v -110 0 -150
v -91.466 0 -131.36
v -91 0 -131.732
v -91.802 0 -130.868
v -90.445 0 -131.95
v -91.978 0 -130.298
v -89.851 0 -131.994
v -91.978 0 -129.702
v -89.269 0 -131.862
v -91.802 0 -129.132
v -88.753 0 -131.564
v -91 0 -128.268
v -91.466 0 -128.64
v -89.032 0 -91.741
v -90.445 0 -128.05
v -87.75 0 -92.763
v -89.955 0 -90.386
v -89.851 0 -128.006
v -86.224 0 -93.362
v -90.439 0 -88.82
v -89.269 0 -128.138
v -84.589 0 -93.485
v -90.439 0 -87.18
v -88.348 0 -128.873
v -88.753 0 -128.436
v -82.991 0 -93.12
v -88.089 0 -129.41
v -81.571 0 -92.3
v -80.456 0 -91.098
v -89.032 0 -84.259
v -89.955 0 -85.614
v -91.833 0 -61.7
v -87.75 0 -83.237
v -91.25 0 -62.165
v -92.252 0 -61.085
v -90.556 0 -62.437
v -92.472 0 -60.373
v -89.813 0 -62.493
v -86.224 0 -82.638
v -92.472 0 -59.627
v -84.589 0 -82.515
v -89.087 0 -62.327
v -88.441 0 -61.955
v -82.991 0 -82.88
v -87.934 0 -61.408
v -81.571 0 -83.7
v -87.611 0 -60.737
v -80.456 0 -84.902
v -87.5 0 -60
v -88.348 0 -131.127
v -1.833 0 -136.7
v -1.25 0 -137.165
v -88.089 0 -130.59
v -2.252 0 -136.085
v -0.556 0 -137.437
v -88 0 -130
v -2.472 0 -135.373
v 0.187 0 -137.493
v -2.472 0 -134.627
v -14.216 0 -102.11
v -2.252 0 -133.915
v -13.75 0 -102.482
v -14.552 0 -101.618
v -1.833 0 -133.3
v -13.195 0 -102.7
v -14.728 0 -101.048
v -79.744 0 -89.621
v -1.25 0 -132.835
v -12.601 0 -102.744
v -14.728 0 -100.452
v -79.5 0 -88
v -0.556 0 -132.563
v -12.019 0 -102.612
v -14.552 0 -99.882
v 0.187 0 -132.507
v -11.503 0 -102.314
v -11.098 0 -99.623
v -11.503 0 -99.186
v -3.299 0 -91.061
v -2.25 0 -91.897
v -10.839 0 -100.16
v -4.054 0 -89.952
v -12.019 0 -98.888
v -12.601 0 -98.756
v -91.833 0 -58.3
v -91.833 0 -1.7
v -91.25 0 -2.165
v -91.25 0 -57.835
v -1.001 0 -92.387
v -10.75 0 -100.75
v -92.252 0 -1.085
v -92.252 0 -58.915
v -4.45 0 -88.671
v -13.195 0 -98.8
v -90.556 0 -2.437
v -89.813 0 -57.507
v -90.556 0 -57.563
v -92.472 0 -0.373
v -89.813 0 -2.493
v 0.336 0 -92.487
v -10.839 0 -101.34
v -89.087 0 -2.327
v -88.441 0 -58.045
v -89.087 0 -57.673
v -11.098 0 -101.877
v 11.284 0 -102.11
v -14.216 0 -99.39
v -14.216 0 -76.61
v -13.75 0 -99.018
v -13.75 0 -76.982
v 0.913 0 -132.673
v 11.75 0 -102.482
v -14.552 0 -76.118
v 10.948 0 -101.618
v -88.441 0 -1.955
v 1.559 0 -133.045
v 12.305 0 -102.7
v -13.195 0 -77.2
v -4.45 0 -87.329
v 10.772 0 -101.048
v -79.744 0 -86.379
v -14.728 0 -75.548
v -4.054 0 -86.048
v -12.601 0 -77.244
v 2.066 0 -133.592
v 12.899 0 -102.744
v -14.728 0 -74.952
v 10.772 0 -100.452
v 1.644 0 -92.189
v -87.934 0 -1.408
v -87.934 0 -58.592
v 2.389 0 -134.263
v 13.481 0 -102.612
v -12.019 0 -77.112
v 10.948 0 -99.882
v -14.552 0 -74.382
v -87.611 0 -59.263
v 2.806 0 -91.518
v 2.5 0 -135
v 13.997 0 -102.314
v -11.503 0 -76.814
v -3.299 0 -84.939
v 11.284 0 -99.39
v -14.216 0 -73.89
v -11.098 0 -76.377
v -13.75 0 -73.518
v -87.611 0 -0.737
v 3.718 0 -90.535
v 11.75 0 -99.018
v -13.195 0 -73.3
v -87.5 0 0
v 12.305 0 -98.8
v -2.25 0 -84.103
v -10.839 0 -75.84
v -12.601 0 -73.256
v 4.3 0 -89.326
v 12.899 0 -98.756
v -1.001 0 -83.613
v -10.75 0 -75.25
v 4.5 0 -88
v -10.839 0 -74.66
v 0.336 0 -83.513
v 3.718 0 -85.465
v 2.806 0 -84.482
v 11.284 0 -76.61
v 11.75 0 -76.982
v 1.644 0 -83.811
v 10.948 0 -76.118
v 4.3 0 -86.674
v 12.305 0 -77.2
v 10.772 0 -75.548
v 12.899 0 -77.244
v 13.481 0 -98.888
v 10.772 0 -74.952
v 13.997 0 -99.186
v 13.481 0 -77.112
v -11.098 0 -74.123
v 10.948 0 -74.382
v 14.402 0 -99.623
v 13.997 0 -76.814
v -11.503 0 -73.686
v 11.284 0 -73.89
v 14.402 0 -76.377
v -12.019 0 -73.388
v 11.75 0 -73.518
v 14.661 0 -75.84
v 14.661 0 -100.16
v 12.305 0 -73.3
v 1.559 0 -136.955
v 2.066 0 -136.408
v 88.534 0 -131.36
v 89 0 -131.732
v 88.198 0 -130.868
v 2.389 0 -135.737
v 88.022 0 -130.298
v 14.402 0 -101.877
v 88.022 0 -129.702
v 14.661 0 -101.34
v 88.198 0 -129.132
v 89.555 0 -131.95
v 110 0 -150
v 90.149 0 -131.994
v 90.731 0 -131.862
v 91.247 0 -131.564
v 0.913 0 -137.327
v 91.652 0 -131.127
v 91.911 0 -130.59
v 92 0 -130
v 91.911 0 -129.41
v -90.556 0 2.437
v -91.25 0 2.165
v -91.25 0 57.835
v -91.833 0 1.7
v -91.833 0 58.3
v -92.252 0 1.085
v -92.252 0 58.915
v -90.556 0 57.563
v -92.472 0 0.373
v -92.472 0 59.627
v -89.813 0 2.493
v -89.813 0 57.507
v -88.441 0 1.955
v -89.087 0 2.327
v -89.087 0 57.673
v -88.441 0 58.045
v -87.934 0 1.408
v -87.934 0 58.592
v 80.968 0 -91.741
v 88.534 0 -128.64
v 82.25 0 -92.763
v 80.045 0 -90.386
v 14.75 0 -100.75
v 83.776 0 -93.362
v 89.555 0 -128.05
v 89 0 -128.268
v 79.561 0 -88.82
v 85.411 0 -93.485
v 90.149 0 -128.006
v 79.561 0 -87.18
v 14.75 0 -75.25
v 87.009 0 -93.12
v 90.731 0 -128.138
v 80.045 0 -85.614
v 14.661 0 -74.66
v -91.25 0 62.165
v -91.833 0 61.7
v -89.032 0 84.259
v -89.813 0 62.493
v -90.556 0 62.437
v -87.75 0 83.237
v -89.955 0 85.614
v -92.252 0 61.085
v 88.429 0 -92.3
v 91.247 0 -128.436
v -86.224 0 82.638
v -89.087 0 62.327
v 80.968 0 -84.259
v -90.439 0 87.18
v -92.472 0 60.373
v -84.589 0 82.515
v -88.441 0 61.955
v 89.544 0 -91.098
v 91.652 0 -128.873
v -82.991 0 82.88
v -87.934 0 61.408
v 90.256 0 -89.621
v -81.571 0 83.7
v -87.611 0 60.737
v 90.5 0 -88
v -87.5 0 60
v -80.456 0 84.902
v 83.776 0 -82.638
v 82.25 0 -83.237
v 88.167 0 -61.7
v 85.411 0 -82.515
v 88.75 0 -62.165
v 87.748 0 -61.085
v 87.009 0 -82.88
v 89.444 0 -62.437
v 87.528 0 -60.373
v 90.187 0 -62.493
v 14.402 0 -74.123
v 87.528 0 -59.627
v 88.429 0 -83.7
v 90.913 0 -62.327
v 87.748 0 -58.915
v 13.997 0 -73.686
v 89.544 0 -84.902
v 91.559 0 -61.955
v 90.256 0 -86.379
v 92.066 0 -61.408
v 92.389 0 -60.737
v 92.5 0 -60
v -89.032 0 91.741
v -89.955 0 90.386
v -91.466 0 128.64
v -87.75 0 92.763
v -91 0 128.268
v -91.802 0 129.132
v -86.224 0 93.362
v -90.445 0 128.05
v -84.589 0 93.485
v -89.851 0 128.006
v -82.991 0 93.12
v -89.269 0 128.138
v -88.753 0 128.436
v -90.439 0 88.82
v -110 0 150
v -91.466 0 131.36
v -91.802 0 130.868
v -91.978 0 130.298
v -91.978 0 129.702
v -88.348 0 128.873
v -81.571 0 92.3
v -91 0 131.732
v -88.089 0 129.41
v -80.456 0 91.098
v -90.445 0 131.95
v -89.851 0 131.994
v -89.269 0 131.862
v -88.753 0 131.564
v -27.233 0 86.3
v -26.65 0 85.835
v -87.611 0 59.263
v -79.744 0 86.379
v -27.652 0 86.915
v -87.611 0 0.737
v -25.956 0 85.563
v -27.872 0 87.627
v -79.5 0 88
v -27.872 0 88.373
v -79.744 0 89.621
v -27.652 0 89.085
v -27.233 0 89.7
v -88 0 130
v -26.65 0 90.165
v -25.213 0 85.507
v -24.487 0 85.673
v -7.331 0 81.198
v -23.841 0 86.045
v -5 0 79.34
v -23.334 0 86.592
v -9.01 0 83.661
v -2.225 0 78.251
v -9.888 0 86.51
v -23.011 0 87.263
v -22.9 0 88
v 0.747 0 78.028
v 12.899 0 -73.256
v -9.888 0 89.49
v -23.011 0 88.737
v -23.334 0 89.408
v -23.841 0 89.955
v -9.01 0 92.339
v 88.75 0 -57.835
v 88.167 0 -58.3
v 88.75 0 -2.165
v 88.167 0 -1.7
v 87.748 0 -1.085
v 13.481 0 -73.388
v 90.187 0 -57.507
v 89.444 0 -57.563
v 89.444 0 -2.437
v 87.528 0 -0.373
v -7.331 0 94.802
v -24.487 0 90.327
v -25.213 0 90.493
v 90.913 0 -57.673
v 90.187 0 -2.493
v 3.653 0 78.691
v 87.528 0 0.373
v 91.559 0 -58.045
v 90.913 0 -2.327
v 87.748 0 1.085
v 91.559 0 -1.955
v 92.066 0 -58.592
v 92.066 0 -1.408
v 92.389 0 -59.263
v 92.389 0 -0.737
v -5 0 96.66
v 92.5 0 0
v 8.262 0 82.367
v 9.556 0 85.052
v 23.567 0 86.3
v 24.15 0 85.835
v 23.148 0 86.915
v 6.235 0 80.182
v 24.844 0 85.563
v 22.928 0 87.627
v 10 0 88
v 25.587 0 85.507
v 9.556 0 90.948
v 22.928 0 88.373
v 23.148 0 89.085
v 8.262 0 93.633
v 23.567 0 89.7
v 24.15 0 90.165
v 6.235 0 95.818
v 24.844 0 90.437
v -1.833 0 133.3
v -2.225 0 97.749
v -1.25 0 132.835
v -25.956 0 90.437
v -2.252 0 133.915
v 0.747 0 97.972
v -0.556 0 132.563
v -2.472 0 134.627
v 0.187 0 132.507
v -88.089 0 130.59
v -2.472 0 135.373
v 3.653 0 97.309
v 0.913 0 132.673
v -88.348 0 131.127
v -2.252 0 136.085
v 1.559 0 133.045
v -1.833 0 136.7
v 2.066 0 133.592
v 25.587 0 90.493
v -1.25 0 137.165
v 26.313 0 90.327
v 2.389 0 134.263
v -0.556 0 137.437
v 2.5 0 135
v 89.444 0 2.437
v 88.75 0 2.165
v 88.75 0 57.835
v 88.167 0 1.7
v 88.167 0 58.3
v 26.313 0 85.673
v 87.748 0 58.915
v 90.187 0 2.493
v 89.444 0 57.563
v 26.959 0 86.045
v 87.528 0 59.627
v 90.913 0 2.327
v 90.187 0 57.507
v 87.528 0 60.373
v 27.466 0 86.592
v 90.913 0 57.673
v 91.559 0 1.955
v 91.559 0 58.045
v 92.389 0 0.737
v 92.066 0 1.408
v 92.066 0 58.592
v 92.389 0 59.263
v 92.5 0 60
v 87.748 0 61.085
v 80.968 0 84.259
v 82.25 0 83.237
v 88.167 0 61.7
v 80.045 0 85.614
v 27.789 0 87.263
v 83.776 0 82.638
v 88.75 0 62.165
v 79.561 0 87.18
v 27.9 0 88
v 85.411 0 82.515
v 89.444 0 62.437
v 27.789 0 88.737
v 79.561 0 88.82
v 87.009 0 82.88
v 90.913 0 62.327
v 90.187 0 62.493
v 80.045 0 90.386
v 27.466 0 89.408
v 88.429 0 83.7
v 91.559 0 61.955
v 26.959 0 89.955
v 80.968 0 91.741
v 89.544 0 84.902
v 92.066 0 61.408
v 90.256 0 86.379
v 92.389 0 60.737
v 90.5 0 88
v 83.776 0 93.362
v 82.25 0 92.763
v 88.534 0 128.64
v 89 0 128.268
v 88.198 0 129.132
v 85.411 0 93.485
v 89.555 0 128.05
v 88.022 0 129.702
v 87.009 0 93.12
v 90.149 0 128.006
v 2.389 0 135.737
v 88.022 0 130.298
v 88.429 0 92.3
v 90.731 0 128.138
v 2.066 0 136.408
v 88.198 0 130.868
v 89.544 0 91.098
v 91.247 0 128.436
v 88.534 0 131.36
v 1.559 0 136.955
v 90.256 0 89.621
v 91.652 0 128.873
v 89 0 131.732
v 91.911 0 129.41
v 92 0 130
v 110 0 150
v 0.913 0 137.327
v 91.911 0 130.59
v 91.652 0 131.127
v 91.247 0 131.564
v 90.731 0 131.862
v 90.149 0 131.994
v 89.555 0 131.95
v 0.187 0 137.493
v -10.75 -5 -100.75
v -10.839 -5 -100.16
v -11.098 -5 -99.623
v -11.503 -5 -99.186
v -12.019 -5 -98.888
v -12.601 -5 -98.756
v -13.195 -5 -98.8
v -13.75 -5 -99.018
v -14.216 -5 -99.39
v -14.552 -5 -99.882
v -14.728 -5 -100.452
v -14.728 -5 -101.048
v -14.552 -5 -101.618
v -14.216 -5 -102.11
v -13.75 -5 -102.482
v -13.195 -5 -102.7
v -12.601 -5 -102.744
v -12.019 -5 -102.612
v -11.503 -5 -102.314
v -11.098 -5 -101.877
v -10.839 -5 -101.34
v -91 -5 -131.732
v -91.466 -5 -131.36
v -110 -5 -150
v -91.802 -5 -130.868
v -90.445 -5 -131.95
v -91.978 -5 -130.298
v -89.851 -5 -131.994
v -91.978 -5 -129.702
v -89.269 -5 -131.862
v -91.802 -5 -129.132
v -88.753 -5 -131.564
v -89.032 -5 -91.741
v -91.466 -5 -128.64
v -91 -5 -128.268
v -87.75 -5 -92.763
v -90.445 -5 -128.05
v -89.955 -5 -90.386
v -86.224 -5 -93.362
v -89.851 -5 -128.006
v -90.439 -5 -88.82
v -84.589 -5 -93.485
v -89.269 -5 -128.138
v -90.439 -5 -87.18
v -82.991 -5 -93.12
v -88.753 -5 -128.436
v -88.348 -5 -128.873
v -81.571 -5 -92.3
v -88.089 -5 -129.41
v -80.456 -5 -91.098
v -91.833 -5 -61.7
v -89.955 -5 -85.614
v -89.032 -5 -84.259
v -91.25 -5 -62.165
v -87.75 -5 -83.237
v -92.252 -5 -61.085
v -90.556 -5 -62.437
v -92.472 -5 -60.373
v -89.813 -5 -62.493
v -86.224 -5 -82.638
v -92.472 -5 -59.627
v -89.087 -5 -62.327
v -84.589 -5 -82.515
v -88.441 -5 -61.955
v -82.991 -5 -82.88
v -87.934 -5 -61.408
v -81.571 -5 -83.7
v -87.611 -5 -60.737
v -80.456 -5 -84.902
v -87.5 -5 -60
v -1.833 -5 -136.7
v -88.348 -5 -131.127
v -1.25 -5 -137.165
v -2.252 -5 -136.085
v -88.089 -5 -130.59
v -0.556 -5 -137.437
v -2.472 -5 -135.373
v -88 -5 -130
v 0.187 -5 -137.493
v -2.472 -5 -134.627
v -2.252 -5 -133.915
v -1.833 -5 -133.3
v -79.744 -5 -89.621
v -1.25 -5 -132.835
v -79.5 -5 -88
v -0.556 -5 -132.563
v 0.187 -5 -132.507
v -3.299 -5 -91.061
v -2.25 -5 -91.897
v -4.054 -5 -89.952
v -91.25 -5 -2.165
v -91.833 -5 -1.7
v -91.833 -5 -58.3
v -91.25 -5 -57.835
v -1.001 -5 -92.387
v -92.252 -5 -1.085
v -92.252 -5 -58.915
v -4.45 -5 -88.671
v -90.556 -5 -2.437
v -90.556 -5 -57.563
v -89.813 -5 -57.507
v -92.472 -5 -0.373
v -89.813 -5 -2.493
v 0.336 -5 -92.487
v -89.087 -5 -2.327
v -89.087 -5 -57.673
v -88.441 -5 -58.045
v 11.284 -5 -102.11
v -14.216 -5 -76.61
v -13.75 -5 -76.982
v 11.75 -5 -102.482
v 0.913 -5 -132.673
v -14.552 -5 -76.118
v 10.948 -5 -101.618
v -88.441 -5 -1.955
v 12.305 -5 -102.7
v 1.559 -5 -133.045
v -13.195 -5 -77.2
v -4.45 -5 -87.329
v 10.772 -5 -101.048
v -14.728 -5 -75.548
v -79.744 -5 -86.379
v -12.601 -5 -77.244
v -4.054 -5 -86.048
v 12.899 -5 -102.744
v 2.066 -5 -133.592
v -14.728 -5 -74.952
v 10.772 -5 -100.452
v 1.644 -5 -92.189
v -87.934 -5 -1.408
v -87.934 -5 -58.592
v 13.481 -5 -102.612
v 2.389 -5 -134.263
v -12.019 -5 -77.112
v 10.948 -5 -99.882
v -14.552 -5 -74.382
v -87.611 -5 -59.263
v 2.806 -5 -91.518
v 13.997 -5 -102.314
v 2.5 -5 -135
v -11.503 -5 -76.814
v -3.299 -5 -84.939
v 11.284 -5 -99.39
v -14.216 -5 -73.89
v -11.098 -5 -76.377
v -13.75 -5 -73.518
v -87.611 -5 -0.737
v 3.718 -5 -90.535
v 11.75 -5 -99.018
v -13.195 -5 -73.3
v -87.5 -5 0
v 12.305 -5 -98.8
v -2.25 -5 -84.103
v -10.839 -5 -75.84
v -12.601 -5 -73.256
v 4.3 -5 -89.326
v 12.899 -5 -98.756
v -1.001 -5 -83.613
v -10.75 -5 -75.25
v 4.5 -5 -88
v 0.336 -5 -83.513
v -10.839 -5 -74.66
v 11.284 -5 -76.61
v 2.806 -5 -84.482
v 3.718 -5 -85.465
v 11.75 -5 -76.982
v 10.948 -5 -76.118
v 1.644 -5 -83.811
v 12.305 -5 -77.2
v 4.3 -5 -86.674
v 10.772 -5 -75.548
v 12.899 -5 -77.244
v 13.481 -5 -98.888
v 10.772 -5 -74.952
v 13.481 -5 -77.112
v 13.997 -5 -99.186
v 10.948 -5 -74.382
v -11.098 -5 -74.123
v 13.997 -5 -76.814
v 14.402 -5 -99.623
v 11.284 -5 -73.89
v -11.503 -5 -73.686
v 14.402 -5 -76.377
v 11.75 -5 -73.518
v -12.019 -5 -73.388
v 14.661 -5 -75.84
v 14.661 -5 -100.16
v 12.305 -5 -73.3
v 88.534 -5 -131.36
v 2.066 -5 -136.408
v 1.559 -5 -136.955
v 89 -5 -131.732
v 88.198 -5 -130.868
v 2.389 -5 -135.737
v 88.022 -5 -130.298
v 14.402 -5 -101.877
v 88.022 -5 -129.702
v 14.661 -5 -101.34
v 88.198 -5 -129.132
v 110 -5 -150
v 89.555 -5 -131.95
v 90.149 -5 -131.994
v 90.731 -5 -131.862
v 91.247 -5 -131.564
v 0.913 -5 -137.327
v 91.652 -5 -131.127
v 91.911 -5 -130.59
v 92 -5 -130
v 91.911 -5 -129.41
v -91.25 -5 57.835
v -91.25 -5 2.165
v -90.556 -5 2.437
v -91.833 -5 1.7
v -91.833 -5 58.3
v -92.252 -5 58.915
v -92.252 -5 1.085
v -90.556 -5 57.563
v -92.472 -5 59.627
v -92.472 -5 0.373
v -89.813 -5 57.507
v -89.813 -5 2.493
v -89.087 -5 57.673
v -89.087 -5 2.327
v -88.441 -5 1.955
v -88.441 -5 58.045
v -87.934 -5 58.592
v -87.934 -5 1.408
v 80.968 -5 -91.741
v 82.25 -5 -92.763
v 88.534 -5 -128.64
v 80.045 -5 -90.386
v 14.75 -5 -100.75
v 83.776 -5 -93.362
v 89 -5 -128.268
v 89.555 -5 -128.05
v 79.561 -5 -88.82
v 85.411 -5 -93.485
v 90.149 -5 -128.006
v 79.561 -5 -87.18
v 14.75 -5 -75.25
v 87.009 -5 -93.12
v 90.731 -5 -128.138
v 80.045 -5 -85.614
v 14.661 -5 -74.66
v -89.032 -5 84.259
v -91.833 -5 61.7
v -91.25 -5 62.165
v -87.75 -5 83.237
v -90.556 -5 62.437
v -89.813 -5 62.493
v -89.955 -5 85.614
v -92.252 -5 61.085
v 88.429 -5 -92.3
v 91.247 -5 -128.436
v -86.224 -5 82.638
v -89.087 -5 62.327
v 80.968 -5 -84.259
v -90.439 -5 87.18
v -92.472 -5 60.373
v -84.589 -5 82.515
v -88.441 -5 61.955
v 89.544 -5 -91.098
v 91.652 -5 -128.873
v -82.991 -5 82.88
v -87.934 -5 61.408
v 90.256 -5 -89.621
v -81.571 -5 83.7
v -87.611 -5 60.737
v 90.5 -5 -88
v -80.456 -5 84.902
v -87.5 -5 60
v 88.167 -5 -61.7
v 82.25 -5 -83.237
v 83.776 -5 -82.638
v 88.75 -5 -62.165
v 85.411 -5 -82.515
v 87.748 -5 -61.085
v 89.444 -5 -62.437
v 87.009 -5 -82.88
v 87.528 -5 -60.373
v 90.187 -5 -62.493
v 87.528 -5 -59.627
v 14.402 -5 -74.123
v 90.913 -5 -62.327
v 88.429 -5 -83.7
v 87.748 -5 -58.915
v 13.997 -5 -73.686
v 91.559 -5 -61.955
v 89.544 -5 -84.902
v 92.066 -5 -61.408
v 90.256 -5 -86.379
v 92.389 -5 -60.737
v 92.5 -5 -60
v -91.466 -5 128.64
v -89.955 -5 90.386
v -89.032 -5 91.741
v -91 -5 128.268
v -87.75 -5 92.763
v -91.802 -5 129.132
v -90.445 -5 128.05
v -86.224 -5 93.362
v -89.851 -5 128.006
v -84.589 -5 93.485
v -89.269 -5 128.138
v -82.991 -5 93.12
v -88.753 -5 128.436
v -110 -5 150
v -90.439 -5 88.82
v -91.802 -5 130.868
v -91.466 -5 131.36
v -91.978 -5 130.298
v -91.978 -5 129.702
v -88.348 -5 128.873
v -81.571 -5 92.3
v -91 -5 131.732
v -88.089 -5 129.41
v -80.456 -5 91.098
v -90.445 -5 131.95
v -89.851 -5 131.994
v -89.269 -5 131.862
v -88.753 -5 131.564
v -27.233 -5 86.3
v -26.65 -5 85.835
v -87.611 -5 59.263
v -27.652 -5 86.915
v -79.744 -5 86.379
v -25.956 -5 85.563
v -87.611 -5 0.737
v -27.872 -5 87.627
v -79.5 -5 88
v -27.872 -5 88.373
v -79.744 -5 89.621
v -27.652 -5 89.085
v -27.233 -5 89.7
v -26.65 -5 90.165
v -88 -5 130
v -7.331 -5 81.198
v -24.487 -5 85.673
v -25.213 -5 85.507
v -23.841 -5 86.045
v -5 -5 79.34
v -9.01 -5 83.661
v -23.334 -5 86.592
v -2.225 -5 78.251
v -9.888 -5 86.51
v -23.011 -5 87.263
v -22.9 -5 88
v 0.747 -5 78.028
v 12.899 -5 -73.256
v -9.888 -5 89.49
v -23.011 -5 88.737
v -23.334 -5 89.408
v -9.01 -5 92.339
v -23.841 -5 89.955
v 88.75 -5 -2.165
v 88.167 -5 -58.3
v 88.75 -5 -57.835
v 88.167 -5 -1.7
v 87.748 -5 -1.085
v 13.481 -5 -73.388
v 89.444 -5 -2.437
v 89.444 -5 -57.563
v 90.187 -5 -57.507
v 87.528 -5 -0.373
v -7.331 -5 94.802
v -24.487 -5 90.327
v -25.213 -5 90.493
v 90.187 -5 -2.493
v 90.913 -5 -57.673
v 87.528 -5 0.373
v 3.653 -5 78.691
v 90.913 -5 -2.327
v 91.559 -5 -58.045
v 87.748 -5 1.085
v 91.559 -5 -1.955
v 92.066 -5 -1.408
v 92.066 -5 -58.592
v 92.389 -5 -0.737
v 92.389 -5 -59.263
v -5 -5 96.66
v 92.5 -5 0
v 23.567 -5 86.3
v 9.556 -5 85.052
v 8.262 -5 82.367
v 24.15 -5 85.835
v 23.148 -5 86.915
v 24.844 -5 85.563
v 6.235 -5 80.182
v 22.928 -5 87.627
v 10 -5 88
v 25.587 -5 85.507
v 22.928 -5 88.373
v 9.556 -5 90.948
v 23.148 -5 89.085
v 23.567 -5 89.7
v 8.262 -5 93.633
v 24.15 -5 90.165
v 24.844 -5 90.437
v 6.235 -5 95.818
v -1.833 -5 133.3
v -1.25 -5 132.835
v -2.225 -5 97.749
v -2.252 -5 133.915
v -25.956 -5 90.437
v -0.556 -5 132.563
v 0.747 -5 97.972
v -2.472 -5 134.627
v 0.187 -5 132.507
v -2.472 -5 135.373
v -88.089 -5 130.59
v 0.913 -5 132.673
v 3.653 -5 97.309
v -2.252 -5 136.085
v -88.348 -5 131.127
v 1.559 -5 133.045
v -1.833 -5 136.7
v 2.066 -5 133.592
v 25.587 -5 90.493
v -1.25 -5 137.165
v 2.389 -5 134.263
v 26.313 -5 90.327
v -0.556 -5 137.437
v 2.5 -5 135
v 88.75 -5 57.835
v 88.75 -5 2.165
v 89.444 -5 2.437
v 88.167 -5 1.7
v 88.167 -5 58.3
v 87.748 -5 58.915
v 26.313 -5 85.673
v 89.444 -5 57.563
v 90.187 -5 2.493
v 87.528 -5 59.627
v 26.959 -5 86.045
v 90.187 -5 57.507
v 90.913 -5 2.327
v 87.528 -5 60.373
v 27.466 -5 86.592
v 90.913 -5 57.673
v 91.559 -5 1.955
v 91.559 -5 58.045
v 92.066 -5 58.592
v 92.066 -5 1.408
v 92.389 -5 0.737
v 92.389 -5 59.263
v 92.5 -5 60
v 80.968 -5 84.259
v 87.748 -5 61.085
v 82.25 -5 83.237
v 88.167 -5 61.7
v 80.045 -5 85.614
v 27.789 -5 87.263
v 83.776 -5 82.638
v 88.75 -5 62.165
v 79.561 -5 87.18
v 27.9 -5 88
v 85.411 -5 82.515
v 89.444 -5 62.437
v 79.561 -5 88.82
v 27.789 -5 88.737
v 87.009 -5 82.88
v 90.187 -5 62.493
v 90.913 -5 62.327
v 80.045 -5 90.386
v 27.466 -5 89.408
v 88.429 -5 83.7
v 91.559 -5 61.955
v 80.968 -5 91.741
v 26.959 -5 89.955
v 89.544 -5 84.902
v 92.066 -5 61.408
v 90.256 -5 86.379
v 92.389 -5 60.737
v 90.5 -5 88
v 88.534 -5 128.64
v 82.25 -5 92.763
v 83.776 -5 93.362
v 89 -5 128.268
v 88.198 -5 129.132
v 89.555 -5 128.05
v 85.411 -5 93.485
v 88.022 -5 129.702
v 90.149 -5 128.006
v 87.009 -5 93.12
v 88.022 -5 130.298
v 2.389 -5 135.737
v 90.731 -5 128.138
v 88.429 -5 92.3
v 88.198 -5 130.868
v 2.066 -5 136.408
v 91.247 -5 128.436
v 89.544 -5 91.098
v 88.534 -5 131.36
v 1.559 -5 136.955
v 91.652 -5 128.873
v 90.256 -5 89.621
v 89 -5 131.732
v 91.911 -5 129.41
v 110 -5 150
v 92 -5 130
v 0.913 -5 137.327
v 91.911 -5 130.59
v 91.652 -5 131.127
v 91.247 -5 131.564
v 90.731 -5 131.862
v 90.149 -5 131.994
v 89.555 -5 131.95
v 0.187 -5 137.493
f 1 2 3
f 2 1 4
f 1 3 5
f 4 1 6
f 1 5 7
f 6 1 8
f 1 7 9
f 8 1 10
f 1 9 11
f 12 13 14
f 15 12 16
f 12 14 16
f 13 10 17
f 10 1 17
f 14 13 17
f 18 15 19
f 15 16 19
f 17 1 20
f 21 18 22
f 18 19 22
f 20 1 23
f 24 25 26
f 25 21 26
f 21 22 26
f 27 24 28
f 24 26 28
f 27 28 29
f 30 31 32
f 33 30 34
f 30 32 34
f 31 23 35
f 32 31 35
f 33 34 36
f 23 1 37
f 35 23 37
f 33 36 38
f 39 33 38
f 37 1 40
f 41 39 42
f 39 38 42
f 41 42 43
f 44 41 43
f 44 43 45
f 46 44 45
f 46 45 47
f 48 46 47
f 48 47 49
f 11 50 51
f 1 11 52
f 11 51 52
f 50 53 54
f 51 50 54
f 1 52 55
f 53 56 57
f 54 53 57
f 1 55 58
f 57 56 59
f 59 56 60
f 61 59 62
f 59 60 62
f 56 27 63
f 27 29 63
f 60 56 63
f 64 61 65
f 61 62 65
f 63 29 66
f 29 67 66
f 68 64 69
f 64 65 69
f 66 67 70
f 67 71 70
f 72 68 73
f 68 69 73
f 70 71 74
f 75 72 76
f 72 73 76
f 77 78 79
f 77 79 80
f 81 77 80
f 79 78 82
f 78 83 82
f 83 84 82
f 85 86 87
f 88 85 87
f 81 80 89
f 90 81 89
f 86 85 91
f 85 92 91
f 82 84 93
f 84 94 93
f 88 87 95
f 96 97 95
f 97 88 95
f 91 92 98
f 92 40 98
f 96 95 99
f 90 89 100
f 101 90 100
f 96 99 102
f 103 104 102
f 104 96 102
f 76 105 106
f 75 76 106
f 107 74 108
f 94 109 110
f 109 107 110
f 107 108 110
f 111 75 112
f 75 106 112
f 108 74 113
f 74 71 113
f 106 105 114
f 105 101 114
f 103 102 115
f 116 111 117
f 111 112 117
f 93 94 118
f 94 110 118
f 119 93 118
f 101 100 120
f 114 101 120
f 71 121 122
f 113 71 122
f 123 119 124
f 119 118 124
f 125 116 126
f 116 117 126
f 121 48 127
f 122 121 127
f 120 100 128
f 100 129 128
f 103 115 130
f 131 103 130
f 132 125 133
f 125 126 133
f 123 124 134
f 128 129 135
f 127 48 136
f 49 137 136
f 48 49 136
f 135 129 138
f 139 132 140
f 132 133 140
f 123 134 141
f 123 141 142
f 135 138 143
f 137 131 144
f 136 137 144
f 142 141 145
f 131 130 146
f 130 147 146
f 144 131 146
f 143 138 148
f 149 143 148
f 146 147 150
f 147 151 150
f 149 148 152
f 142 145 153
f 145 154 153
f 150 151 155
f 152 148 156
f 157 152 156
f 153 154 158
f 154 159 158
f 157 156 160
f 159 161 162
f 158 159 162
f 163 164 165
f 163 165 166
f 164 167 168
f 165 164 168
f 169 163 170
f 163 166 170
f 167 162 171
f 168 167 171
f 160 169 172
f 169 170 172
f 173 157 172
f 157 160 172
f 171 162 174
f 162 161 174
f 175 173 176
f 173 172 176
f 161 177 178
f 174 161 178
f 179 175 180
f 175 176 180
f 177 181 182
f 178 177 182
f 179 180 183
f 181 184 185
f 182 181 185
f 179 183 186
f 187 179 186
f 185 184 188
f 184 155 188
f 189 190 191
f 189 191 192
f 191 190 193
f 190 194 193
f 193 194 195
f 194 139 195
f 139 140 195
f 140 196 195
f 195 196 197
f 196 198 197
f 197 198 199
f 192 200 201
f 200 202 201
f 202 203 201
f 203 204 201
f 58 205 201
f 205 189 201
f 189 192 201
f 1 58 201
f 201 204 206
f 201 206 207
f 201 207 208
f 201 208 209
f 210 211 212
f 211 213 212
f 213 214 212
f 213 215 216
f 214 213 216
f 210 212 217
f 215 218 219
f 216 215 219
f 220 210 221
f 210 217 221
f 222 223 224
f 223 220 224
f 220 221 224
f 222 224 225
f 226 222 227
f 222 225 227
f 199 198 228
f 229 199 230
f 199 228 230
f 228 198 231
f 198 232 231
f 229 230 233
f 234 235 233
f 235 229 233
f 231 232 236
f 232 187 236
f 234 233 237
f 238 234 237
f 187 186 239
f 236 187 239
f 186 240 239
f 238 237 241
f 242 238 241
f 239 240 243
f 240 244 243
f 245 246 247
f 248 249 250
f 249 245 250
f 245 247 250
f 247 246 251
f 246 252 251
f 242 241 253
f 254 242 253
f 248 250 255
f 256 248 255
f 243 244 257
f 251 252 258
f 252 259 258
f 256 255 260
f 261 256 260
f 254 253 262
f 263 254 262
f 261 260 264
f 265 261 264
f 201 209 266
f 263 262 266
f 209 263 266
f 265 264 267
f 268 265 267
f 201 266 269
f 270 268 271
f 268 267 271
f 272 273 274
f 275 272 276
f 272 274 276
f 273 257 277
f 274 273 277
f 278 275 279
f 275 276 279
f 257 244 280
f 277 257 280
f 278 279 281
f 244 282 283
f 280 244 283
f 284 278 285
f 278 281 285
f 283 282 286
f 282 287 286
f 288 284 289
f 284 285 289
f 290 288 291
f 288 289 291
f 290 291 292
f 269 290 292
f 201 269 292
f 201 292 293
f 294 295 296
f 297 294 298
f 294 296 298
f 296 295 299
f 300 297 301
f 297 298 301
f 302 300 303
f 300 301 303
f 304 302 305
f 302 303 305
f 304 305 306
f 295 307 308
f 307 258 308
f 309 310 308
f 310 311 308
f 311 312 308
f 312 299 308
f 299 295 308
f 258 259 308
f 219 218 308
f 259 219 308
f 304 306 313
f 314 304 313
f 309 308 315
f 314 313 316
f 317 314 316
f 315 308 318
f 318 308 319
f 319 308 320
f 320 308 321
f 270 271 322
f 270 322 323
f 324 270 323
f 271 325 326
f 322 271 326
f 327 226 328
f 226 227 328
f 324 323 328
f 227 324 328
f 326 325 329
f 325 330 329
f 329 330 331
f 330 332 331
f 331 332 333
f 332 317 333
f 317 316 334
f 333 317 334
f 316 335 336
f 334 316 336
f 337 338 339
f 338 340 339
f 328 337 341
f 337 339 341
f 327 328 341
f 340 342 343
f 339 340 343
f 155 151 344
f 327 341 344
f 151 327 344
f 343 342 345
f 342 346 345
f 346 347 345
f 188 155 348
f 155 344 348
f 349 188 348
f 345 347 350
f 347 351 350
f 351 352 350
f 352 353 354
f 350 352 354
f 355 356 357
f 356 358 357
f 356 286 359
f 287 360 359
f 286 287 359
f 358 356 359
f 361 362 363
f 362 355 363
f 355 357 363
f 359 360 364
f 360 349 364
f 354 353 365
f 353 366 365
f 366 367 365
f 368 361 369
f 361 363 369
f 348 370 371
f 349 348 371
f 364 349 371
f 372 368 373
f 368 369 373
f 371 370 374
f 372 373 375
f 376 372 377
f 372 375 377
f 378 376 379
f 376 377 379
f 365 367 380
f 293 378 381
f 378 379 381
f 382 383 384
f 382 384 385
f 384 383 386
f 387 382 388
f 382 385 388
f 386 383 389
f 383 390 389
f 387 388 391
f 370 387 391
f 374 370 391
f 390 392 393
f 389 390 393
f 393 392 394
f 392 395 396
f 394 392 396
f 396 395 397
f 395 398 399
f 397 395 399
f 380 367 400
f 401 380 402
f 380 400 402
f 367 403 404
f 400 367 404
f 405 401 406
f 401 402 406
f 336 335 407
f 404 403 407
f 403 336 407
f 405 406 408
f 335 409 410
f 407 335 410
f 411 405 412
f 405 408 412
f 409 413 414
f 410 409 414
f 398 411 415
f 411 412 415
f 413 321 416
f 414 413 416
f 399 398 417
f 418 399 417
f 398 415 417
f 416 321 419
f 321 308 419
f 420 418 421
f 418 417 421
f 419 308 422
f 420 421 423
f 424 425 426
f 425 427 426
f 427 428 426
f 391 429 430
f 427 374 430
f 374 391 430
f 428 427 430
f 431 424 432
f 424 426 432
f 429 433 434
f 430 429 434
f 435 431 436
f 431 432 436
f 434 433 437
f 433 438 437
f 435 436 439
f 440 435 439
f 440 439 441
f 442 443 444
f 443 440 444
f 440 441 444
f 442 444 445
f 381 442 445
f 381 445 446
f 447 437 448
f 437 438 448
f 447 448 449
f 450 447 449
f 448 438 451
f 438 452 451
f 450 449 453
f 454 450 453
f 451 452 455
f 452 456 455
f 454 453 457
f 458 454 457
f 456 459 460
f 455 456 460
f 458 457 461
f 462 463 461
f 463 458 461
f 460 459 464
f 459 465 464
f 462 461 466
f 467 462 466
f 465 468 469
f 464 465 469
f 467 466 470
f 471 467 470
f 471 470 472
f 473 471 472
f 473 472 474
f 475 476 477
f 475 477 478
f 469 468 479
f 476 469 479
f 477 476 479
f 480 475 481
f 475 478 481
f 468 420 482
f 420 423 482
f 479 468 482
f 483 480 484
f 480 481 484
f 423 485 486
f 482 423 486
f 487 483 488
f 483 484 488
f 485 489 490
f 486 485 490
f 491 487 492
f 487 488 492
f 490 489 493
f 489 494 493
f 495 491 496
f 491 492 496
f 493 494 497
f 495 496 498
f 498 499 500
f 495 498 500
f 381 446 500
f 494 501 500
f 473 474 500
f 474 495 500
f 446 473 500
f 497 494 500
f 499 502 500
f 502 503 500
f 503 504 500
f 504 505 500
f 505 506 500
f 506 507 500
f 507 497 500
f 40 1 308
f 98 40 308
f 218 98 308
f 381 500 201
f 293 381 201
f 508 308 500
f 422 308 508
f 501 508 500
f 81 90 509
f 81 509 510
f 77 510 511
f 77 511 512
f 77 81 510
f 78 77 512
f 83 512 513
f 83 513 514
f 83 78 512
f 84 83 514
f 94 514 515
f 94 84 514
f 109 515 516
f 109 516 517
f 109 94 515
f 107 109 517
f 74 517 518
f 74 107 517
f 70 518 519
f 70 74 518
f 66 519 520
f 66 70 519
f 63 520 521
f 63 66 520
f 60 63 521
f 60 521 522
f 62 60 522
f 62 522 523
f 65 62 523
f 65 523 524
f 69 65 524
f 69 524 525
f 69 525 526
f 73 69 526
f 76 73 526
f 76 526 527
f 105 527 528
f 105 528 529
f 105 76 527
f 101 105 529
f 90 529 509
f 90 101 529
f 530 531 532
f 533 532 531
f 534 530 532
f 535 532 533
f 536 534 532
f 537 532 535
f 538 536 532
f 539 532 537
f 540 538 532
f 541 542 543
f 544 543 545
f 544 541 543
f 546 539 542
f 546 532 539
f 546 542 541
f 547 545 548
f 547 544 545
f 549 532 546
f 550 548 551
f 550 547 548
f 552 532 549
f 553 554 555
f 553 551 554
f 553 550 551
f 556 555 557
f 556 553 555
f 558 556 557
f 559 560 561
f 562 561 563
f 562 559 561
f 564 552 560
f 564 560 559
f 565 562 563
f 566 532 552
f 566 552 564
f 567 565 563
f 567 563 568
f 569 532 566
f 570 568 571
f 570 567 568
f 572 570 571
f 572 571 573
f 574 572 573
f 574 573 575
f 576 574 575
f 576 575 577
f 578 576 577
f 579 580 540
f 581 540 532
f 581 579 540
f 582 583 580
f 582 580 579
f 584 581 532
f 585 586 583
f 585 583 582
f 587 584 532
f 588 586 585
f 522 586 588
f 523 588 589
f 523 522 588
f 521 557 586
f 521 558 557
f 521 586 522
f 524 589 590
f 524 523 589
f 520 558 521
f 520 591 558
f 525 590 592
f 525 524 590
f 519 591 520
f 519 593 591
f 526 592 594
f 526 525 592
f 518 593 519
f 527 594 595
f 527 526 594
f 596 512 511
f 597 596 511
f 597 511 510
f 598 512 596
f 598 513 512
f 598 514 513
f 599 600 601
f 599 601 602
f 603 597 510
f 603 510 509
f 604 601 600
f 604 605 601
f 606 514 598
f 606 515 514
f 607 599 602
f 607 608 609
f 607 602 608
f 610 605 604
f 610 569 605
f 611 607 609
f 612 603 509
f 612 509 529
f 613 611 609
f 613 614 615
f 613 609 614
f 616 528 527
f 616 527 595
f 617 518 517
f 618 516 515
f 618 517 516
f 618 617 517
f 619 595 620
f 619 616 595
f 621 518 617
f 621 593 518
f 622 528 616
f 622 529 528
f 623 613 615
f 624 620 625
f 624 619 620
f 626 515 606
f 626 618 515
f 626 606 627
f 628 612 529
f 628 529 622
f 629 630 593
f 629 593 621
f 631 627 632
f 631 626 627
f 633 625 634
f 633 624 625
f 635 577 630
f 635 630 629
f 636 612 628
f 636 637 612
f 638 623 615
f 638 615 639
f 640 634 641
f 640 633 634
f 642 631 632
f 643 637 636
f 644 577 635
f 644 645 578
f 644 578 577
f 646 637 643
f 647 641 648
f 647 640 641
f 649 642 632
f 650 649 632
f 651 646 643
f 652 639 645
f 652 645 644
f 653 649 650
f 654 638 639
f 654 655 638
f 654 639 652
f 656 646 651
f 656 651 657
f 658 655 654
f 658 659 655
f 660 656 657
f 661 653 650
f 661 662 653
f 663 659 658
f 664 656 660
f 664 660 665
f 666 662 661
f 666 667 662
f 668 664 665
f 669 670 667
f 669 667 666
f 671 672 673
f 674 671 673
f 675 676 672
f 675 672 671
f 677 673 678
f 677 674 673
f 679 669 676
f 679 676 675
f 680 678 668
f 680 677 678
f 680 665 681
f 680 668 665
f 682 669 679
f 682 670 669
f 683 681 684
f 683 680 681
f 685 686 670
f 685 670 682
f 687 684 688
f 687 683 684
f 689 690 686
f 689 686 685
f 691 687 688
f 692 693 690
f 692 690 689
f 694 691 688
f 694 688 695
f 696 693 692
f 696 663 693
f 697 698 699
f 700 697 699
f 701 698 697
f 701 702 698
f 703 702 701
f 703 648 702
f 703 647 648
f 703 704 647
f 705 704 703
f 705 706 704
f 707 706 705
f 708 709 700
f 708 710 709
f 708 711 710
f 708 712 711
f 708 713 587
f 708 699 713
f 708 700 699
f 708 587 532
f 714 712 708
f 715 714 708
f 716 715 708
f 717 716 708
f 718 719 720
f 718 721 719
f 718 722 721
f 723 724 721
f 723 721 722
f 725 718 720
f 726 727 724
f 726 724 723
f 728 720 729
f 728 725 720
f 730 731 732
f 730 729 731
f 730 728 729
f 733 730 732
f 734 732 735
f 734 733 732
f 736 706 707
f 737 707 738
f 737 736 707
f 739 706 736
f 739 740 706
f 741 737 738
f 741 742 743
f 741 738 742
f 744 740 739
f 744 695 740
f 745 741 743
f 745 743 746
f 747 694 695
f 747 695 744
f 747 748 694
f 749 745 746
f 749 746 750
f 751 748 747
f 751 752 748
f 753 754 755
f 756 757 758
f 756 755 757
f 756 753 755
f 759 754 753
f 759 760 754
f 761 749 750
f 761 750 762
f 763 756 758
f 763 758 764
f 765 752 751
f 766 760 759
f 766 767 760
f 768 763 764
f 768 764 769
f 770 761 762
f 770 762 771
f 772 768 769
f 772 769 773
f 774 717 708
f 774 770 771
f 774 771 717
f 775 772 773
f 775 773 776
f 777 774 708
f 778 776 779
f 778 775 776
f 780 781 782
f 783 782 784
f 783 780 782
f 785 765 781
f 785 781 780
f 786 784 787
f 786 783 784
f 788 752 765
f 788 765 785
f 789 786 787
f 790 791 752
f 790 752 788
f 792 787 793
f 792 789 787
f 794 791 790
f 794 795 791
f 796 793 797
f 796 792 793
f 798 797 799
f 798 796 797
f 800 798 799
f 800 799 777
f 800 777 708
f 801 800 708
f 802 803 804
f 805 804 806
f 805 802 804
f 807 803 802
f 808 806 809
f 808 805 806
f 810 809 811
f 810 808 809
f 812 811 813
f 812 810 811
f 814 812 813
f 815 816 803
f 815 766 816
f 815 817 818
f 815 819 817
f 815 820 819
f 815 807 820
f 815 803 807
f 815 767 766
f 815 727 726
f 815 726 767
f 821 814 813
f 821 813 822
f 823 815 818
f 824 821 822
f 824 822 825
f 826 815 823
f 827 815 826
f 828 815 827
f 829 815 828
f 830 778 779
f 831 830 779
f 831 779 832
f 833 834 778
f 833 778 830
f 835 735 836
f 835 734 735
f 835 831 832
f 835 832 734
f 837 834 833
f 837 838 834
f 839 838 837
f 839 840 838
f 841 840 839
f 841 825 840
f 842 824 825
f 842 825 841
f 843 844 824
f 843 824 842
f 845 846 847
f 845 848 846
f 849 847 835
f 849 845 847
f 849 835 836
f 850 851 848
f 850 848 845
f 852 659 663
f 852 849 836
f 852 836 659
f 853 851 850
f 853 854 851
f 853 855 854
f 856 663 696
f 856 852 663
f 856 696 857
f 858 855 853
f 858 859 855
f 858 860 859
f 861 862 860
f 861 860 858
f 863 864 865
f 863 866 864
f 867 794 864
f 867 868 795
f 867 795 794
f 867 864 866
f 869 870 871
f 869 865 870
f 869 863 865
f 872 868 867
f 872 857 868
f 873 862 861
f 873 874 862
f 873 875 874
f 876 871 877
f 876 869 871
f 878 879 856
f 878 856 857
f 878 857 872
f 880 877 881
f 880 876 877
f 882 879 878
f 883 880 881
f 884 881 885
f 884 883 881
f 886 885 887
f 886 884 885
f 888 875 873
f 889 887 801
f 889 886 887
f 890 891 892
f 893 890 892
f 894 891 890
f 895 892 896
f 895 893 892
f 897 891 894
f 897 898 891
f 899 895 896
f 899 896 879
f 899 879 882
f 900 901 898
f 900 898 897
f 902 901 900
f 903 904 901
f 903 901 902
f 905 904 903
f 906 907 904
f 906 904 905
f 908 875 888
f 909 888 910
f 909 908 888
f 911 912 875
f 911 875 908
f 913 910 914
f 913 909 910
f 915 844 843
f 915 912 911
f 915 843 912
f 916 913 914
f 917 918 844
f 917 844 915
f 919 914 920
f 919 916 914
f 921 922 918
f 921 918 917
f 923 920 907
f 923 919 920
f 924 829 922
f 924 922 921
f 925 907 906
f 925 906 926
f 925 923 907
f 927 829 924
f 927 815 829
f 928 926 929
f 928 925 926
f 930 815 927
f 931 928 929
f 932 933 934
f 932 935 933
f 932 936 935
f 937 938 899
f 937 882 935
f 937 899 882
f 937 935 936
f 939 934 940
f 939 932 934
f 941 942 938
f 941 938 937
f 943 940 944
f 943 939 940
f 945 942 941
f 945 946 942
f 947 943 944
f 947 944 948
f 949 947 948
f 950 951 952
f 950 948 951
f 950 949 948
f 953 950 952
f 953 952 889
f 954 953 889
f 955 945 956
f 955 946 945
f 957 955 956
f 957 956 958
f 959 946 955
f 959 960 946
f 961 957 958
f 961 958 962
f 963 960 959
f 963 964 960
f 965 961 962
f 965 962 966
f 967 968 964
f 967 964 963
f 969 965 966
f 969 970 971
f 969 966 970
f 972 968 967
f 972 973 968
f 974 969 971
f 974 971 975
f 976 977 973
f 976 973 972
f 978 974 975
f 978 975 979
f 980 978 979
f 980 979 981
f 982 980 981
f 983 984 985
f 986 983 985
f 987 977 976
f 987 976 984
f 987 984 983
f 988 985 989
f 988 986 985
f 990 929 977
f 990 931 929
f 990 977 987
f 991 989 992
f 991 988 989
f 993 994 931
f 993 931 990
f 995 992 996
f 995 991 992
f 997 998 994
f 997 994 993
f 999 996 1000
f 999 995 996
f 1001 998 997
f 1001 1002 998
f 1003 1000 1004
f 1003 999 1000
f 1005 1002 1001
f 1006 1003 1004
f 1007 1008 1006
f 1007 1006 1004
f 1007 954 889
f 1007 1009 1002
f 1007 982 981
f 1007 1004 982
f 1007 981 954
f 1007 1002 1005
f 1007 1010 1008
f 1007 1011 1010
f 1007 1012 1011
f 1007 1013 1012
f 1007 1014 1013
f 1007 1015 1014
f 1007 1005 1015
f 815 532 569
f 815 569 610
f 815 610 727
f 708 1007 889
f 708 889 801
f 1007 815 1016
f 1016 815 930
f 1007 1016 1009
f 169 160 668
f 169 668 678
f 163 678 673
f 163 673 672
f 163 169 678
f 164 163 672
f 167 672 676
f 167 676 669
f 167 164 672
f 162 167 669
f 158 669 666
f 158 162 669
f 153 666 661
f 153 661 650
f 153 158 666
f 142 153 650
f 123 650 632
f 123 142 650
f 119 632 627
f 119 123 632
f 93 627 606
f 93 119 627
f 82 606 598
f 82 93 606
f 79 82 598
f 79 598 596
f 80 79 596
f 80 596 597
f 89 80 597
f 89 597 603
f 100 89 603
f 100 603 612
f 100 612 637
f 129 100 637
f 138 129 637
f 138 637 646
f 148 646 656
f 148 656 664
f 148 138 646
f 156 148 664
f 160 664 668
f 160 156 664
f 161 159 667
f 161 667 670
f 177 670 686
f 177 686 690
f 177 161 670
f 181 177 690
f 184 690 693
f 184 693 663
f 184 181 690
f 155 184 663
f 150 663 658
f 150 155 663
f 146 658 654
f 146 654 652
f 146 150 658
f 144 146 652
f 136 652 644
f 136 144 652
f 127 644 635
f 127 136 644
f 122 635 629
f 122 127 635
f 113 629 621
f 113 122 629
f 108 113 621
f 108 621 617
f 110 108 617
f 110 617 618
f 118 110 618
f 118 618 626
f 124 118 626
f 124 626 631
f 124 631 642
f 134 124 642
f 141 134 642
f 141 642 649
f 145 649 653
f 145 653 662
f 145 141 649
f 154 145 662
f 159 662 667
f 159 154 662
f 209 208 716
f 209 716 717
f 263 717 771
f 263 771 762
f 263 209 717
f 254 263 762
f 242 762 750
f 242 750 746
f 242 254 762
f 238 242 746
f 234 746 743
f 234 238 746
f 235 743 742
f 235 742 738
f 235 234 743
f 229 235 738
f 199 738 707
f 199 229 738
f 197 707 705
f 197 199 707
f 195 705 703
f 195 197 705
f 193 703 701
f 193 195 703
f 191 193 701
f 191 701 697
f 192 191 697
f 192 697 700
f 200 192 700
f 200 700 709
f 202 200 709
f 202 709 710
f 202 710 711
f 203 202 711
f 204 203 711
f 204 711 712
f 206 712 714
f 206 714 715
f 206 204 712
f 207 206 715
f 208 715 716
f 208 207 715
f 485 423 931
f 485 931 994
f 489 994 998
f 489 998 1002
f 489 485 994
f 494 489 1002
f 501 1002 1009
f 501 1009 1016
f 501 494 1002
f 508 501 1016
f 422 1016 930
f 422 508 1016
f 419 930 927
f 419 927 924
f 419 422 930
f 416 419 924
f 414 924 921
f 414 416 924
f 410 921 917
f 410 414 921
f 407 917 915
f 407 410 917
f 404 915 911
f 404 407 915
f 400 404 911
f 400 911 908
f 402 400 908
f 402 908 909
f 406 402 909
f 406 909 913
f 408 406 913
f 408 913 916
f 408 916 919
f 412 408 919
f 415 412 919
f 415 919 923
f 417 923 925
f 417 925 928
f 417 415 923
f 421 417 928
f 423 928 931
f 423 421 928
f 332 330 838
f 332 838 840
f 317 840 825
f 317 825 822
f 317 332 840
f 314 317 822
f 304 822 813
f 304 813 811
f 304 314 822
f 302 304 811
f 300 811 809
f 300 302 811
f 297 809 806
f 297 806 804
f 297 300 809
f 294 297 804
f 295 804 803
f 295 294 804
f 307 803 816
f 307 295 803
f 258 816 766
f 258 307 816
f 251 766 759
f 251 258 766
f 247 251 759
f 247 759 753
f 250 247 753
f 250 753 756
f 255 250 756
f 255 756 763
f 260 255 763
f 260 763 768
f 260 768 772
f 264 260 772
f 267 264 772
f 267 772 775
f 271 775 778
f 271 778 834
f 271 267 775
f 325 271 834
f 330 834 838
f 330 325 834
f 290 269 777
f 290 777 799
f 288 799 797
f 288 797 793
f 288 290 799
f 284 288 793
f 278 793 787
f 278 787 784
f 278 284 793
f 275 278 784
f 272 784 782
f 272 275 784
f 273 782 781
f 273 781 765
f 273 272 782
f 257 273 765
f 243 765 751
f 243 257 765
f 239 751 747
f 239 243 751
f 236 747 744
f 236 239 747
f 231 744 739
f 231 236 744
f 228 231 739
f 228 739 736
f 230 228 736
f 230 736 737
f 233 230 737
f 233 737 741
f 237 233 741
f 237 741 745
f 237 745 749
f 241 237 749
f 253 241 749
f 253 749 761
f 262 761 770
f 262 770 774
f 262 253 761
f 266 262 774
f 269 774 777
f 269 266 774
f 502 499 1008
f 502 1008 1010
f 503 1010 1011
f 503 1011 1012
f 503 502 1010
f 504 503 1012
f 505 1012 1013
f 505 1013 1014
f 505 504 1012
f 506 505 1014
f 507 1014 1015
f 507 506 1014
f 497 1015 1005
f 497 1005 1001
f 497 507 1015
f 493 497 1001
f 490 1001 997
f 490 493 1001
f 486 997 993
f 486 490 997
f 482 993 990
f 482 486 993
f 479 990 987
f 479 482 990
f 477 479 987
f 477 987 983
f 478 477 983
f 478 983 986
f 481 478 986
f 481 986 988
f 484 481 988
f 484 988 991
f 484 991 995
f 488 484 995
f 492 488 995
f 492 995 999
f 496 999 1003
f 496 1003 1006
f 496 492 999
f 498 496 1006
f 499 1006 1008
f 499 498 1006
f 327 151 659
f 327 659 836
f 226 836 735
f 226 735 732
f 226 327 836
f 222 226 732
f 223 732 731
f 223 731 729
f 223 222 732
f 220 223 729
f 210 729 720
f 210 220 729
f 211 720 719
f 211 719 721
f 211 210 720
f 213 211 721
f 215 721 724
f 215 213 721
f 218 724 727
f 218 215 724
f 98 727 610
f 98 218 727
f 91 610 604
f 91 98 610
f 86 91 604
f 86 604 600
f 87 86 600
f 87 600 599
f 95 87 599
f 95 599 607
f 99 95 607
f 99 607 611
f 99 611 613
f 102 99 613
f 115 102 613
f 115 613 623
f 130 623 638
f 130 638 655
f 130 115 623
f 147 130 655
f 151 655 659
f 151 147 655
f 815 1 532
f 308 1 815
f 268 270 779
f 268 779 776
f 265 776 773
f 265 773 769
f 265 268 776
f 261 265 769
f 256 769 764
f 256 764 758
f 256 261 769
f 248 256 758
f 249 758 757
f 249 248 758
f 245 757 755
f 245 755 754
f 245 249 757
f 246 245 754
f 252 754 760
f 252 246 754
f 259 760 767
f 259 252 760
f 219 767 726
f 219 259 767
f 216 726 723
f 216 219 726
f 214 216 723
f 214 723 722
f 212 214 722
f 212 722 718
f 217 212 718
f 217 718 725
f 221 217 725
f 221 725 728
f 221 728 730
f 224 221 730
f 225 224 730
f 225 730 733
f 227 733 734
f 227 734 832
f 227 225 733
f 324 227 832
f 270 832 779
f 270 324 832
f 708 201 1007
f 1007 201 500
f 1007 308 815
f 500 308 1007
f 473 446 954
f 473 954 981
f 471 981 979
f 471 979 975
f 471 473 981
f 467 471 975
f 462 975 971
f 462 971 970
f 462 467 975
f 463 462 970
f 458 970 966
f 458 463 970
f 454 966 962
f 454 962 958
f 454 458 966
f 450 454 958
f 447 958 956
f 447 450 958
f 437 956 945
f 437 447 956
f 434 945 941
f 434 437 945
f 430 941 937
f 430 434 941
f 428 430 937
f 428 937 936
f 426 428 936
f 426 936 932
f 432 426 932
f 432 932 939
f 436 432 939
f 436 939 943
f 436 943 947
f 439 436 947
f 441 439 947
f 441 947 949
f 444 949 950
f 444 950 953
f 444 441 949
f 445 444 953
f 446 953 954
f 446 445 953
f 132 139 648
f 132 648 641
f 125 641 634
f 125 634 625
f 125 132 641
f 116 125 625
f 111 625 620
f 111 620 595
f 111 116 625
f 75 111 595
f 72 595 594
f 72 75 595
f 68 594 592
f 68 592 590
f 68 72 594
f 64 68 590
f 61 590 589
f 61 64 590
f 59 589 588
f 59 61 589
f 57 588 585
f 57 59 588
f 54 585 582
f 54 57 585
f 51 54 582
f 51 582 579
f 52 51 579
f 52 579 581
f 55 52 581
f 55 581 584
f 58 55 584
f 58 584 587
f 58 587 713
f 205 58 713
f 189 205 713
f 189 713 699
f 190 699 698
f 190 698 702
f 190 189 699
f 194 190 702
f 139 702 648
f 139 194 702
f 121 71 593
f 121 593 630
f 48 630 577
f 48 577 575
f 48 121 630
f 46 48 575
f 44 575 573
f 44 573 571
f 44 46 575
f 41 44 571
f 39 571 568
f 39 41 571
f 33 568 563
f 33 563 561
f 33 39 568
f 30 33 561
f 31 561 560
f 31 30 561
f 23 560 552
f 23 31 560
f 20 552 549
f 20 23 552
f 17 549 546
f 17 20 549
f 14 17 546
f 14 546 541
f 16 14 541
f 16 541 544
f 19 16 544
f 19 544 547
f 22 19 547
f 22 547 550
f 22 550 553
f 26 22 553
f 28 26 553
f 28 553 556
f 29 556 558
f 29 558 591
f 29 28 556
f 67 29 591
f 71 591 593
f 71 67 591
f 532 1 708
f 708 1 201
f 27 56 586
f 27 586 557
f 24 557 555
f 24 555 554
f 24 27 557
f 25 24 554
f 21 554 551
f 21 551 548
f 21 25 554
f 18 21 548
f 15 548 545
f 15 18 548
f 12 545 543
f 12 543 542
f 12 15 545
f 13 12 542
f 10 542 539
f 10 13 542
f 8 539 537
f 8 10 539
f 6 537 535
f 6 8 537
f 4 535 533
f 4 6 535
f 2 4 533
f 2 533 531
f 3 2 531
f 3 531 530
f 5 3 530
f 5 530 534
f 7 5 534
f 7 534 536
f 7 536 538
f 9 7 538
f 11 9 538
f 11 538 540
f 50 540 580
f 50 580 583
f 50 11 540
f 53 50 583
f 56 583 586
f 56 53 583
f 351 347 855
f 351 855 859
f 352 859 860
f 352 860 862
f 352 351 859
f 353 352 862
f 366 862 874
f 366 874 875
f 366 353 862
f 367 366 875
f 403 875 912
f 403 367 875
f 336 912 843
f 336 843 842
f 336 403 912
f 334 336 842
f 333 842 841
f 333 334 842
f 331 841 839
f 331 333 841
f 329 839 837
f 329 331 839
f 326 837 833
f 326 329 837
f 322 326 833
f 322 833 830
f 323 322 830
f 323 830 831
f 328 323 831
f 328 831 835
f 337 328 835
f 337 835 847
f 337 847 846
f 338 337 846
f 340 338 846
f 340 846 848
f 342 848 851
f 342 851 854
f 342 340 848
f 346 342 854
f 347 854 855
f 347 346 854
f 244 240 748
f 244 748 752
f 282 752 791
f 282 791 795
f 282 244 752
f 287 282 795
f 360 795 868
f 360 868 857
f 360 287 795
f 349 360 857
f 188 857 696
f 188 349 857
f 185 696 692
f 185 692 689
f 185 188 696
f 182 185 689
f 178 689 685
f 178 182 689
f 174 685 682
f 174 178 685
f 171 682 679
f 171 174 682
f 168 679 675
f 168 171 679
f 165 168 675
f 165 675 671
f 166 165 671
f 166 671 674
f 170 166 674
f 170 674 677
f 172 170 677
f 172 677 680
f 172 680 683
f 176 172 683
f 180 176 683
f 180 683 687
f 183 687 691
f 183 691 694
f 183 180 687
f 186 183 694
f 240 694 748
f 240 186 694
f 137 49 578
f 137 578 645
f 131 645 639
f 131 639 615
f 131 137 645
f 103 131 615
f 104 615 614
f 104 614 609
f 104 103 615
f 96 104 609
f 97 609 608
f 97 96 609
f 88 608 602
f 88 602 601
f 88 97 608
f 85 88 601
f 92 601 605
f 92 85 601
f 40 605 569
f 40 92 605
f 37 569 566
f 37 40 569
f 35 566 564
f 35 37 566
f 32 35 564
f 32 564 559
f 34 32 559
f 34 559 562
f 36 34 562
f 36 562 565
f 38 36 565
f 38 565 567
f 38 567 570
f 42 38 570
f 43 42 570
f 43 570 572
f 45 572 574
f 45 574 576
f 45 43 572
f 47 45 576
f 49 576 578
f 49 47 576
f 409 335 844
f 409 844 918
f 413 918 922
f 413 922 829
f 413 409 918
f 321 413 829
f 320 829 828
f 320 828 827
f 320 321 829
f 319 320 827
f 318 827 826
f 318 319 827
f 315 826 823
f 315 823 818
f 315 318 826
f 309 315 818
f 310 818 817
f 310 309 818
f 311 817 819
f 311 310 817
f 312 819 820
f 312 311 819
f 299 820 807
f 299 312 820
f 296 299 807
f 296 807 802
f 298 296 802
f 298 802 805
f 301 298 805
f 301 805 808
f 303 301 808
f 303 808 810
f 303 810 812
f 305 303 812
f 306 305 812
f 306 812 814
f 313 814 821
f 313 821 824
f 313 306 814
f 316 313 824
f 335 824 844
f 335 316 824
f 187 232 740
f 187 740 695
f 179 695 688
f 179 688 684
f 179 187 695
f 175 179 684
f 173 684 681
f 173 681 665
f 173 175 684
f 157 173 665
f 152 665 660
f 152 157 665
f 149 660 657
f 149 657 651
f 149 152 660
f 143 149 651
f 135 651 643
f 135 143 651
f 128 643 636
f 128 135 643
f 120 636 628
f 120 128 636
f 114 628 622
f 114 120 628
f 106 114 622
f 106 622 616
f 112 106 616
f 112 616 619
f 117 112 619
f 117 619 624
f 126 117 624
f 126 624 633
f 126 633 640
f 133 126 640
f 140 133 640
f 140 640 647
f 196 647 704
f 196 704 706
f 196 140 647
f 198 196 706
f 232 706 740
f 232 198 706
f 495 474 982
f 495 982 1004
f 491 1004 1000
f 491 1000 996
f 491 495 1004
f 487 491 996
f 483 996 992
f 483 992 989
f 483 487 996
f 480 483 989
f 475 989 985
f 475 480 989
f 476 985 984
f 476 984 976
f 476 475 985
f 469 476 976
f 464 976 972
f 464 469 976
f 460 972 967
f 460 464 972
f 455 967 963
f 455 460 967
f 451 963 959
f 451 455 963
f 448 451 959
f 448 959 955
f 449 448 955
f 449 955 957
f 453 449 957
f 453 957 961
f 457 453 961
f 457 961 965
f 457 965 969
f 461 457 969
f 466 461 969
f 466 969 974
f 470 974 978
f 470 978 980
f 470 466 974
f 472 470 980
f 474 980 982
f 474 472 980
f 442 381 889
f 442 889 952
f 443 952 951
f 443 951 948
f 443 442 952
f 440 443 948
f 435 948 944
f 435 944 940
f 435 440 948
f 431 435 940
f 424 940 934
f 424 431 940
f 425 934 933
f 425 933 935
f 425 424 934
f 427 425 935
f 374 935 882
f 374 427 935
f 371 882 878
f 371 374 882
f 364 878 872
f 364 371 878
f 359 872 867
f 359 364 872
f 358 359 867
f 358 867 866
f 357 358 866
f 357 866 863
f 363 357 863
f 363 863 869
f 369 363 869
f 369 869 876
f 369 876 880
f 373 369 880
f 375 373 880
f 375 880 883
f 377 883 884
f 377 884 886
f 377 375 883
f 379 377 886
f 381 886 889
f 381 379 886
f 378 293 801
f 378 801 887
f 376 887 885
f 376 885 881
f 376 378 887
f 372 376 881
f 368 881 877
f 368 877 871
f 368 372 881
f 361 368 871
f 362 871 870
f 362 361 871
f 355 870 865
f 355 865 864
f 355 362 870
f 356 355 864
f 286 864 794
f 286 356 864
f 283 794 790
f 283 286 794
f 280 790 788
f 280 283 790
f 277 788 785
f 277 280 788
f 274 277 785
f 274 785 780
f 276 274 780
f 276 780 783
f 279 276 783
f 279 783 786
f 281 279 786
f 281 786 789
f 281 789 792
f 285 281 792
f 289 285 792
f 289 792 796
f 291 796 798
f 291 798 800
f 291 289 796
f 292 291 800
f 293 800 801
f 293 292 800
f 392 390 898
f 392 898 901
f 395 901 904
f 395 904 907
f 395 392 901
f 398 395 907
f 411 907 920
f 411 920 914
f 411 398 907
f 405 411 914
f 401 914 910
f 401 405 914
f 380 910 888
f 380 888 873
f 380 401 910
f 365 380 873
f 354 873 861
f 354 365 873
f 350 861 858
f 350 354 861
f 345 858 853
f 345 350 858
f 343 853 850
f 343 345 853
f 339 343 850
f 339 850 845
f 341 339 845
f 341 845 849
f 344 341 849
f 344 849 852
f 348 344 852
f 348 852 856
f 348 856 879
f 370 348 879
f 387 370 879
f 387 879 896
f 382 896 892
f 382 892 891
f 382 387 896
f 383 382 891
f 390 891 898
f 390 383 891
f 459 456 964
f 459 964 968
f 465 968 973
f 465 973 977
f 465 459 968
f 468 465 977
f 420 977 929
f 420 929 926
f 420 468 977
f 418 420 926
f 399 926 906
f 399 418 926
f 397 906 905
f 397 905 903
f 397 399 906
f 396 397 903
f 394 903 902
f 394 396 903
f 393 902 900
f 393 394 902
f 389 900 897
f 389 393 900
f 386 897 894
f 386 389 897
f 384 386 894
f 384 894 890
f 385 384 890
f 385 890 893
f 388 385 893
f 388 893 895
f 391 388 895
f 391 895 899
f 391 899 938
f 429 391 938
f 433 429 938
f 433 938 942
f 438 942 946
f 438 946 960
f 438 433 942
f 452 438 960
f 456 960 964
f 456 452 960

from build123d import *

# Parameters (mm, degrees)
SKETCH_W   = 220
SKETCH_H   = 300
SKETCH_R   = 10
SKETCH_R_2 = 2.5
SKETCH_R_3 = 5.5
SKETCH_R_4 = 2
SKETCH_R_5 = 4.5
PAD_DEPTH  = 5


with BuildPart() as part:
    # Sketch → Pad (new body)
    with BuildSketch(Plane.XZ):
        Rectangle(SKETCH_W, SKETCH_H)
        with Locations((0, 88)):
            Circle(SKETCH_R, mode=Mode.SUBTRACT)
        with Locations((25.4, 88)):
            Circle(SKETCH_R_2, mode=Mode.SUBTRACT)
        with Locations((-25.4, 88)):
            Circle(SKETCH_R_2, mode=Mode.SUBTRACT)
        with Locations((85, 88)):
            Circle(SKETCH_R_3, mode=Mode.SUBTRACT)
        with Locations((-85, 88)):
            Circle(SKETCH_R_3, mode=Mode.SUBTRACT)
        with Locations((-85, -88)):
            Circle(SKETCH_R_3, mode=Mode.SUBTRACT)
        with Locations((85, -88)):
            Circle(SKETCH_R_3, mode=Mode.SUBTRACT)
        with Locations((-90, 130)):
            Circle(SKETCH_R_4, mode=Mode.SUBTRACT)
        with Locations((90, 130)):
            Circle(SKETCH_R_4, mode=Mode.SUBTRACT)
        with Locations((-90, -130)):
            Circle(SKETCH_R_4, mode=Mode.SUBTRACT)
        with Locations((90, -130)):
            Circle(SKETCH_R_4, mode=Mode.SUBTRACT)
        with Locations((0, 135)):
            Circle(SKETCH_R_2, mode=Mode.SUBTRACT)
        with Locations((0, -135)):
            Circle(SKETCH_R_2, mode=Mode.SUBTRACT)
        with Locations((90, 0)):
            Circle(SKETCH_R_2, mode=Mode.SUBTRACT)
        with Locations((-90, 0)):
            Circle(SKETCH_R_2, mode=Mode.SUBTRACT)
        with Locations((-90, -60)):
            Circle(SKETCH_R_2, mode=Mode.SUBTRACT)
        with Locations((-90, 60)):
            Circle(SKETCH_R_2, mode=Mode.SUBTRACT)
        with Locations((90, 60)):
            Circle(SKETCH_R_2, mode=Mode.SUBTRACT)
        with Locations((90, -60)):
            Circle(SKETCH_R_2, mode=Mode.SUBTRACT)
        with Locations((0, -88)):
            Circle(SKETCH_R_5, mode=Mode.SUBTRACT)
        with Locations((12.75, -75.25)):
            Circle(SKETCH_R_4, mode=Mode.SUBTRACT)
        with Locations((-12.75, -75.25)):
            Circle(SKETCH_R_4, mode=Mode.SUBTRACT)
        with Locations((-12.75, -100.75)):
            Circle(SKETCH_R_4, mode=Mode.SUBTRACT)
        with Locations((12.75, -100.75)):
            Circle(SKETCH_R_4, mode=Mode.SUBTRACT)
    extrude(amount=PAD_DEPTH)


solid = part.part
